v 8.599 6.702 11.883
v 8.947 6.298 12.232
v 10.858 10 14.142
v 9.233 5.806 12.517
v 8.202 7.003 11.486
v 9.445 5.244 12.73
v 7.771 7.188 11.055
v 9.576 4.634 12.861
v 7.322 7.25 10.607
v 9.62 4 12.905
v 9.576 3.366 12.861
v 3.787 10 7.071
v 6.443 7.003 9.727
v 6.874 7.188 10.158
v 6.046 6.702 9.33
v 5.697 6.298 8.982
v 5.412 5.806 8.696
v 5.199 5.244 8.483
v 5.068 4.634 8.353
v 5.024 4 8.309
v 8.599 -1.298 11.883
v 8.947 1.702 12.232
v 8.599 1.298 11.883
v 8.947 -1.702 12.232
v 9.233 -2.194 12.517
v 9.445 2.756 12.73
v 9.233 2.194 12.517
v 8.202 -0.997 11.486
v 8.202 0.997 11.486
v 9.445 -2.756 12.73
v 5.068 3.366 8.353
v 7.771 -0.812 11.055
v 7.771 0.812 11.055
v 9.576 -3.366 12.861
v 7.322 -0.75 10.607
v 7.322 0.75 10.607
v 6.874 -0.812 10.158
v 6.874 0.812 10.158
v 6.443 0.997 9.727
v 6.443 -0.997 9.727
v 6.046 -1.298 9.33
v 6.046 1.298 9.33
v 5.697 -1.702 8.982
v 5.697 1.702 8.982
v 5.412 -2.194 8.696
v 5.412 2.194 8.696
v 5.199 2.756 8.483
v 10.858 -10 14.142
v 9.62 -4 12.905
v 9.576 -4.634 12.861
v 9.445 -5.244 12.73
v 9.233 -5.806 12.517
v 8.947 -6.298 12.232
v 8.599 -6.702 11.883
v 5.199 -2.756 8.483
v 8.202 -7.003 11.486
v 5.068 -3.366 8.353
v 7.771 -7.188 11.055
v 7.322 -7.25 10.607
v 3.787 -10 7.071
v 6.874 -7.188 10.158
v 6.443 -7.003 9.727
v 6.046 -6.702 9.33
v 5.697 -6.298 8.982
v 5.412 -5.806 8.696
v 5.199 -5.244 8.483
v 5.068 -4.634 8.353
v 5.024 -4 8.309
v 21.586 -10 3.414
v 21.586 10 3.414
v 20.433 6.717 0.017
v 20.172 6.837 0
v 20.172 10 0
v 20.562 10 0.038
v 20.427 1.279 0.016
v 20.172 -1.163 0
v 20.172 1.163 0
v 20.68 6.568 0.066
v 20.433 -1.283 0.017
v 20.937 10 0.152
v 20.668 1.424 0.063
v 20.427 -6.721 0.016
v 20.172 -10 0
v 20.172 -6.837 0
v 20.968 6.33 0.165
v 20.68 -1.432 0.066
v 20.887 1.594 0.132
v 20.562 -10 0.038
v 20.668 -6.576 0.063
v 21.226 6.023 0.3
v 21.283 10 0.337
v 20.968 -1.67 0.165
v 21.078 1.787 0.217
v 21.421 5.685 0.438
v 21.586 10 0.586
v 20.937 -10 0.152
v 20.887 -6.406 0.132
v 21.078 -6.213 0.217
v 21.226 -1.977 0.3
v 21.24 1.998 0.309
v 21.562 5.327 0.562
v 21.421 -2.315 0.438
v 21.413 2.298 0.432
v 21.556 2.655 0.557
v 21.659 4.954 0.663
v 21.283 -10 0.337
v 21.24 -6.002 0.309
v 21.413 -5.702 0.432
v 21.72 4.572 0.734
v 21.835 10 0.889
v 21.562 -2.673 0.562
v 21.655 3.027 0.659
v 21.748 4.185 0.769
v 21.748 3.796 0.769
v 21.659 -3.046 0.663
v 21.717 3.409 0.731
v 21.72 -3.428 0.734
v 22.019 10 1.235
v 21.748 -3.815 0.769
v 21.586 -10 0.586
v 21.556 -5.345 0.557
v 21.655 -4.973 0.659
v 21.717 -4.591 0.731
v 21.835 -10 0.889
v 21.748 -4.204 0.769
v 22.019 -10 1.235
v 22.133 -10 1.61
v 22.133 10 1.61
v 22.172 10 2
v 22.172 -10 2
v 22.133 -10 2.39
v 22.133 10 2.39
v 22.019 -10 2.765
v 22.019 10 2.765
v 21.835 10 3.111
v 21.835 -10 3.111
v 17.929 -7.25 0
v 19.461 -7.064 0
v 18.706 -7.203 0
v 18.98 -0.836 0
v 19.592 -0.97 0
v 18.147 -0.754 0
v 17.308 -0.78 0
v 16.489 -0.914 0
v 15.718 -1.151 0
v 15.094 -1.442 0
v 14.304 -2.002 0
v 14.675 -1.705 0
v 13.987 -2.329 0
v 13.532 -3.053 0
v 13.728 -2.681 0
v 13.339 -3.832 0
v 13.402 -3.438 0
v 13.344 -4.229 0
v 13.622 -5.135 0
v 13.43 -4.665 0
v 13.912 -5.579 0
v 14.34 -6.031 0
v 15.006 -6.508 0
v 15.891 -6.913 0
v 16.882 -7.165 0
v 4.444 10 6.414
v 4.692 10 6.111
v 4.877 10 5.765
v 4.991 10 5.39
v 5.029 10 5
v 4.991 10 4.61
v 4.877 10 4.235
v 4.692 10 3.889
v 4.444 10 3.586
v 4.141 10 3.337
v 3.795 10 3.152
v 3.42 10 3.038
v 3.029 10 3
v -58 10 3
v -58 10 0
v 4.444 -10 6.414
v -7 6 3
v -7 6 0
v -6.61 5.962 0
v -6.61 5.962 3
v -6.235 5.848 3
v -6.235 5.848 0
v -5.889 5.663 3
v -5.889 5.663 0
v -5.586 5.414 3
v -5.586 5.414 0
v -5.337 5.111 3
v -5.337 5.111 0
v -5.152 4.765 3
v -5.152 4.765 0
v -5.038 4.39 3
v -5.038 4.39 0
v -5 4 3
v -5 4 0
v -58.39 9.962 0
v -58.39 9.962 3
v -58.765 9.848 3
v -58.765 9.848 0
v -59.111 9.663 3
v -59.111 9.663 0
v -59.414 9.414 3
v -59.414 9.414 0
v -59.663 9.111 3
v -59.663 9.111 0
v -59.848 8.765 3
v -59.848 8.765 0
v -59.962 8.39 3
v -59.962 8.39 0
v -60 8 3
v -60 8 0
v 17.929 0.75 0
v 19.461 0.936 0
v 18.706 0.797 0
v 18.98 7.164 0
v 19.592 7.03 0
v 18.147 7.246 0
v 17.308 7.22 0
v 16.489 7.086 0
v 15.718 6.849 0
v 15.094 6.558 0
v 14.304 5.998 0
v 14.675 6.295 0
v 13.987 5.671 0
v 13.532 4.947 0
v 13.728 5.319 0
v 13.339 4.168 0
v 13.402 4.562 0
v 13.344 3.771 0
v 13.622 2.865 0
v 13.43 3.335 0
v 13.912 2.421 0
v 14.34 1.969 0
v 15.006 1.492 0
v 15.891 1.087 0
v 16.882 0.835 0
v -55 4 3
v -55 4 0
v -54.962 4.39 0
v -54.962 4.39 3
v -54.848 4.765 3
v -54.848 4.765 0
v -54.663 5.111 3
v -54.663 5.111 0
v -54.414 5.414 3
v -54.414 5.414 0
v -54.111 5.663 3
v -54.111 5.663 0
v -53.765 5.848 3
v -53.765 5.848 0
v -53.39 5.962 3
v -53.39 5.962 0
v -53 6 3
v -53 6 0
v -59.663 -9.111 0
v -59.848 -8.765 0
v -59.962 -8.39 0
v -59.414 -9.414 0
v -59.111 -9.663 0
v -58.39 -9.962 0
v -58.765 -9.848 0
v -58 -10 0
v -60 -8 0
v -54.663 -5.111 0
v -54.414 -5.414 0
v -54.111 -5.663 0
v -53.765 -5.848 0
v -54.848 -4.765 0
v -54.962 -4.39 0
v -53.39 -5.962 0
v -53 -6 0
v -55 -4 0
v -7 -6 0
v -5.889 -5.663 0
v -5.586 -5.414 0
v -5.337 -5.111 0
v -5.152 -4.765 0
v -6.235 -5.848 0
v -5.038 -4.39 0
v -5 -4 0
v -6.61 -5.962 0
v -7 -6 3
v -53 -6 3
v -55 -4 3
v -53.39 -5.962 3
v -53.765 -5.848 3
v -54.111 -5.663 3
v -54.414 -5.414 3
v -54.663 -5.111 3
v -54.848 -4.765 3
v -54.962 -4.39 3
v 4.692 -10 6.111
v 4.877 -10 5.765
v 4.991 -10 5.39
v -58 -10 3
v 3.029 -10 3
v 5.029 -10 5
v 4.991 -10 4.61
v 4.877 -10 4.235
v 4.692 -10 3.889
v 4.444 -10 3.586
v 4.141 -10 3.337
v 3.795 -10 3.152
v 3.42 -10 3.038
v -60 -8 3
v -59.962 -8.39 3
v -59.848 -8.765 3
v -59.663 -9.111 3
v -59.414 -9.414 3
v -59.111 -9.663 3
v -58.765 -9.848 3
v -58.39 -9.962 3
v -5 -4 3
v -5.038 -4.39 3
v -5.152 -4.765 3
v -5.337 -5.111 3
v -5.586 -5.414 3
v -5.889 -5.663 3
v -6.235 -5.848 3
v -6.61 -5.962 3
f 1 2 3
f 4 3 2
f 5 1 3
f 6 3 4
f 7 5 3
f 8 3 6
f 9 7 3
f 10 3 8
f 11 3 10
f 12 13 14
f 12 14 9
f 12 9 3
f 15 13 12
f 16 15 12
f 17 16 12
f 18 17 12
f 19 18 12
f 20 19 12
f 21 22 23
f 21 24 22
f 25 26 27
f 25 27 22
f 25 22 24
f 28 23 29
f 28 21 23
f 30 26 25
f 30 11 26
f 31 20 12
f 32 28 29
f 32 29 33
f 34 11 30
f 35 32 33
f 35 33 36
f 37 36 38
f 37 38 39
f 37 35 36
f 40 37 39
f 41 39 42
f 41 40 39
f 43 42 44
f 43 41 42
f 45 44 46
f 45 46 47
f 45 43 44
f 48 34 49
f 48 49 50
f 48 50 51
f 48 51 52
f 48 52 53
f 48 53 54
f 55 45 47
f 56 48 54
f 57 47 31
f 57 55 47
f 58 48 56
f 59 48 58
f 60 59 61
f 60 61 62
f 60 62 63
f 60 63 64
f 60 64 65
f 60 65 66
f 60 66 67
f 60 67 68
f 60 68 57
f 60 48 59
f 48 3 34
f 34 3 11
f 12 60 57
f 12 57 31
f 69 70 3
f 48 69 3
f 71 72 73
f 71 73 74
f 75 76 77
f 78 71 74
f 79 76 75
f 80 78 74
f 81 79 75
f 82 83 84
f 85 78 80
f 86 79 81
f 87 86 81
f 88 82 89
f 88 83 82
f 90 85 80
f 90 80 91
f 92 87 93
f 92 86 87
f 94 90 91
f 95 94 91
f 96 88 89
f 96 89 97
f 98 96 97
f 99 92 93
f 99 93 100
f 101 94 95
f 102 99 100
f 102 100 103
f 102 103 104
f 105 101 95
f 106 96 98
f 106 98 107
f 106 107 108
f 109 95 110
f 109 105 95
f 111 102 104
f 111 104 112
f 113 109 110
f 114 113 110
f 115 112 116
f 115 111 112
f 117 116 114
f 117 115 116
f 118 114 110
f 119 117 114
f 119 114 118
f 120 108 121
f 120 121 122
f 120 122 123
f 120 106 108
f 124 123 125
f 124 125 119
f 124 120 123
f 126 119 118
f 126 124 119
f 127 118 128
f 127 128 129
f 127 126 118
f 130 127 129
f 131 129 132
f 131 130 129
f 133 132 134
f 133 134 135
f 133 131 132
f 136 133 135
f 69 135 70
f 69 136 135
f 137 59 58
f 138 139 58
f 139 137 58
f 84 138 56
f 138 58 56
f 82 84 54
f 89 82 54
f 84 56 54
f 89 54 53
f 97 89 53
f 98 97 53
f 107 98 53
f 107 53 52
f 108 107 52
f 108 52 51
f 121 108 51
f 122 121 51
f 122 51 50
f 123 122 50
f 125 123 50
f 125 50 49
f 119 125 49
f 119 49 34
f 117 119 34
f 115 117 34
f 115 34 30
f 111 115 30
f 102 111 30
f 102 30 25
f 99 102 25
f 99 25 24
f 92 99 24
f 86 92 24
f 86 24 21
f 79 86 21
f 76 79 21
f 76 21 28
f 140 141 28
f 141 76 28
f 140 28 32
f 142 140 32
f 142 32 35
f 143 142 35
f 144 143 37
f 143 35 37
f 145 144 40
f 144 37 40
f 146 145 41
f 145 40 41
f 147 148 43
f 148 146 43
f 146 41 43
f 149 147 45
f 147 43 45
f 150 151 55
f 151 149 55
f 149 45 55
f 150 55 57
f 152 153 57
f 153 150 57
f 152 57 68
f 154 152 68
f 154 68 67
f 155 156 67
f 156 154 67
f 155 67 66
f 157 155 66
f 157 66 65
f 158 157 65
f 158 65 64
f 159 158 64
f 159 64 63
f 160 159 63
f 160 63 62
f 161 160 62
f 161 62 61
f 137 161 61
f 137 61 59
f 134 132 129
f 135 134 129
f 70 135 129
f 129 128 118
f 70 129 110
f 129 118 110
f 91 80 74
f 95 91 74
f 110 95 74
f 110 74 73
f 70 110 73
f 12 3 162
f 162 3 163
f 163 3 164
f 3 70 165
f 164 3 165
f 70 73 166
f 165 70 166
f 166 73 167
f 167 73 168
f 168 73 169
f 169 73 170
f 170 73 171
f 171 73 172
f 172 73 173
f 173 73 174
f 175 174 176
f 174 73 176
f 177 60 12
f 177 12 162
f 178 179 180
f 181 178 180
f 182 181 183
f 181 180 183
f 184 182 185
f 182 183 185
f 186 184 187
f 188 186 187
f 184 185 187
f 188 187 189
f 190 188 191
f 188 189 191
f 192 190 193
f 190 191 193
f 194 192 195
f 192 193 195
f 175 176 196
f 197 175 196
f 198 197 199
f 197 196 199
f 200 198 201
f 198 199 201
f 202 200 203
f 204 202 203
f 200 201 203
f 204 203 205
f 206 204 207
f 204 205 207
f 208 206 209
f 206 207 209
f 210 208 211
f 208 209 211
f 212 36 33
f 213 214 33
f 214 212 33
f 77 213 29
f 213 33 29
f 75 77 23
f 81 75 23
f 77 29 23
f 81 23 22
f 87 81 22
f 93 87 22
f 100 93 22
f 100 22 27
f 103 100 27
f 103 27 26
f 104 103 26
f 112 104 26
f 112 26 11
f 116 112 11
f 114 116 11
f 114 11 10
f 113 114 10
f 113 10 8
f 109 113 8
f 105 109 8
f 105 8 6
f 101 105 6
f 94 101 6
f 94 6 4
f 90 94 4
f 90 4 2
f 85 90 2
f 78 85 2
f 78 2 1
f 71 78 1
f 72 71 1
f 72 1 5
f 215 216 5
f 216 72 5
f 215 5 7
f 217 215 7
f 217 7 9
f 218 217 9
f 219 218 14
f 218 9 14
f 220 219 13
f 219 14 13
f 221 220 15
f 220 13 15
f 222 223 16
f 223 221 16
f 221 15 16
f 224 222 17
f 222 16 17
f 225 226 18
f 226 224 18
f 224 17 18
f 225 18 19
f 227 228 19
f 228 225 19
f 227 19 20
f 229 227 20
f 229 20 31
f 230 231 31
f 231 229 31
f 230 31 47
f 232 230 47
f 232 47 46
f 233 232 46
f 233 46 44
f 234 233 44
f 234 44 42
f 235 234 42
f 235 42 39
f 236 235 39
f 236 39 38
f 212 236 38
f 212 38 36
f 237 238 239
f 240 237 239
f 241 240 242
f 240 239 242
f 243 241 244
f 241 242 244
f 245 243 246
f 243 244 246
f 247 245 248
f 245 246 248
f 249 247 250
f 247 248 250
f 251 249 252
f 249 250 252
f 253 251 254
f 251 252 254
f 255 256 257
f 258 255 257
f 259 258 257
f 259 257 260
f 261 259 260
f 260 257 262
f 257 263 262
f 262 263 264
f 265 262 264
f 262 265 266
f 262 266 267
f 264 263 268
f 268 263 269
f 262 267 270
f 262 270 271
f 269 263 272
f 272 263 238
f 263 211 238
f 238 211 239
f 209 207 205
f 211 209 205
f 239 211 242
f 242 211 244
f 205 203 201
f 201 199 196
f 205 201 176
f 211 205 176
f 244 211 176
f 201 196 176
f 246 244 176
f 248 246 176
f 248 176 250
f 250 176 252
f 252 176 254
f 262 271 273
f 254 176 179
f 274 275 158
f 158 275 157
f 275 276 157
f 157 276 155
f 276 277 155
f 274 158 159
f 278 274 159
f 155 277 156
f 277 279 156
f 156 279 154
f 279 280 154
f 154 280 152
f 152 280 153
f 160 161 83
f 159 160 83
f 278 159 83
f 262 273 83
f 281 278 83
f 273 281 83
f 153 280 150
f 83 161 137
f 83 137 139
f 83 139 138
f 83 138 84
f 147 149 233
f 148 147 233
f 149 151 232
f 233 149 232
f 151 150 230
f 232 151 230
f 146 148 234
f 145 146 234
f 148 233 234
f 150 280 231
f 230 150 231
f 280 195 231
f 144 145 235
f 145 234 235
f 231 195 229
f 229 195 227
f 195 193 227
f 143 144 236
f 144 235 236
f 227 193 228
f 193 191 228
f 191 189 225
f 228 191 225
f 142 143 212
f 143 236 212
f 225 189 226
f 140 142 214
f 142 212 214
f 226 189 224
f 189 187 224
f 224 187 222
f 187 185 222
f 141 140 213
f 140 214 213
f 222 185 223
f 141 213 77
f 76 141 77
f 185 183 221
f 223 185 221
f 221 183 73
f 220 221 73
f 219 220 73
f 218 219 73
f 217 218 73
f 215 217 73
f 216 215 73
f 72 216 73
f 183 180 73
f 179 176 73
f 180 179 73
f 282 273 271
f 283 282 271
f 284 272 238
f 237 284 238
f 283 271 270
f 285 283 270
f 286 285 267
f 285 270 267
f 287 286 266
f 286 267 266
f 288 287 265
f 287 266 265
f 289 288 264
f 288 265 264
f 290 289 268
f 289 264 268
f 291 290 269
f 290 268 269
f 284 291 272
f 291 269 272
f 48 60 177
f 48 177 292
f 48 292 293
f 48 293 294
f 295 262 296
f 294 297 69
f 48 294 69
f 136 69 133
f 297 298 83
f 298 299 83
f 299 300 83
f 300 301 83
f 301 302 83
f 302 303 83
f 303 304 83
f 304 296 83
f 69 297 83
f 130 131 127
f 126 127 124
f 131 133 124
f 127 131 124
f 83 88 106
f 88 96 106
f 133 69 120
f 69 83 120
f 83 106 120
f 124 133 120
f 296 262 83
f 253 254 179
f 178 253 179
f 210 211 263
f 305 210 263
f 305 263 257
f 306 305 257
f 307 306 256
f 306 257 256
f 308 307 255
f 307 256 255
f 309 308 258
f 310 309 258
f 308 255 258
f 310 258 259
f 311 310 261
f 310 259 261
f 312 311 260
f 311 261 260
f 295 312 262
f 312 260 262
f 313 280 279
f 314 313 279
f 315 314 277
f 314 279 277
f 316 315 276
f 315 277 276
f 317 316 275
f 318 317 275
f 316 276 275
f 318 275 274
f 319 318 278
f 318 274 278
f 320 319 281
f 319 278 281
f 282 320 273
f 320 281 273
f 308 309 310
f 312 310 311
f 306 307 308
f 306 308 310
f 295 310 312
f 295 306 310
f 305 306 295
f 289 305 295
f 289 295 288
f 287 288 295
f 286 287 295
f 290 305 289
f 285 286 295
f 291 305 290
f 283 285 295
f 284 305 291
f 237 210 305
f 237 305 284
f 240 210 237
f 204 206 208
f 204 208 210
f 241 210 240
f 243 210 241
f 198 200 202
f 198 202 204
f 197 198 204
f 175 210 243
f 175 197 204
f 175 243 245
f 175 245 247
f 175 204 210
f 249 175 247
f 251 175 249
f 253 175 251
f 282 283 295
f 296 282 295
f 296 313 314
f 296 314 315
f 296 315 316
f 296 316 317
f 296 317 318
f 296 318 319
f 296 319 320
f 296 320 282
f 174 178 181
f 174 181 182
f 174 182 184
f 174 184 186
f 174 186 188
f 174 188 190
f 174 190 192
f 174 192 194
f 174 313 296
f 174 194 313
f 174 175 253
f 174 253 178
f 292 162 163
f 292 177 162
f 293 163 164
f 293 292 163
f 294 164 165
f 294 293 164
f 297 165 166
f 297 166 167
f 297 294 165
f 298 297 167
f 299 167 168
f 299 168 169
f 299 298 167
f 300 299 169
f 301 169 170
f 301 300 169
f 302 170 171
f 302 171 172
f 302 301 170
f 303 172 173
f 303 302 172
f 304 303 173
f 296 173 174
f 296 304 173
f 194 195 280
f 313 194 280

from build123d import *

# Parameters (mm, degrees)
F1_DEPTH = 10
F2_R     = 3.25
F3_DEPTH = 25
F5_DEPTH = 3


with BuildPart() as f1:
    # F0 (on Front) → F1 (new body, symmetric)
    with BuildSketch(Plane.XZ):
        with BuildLine():
            Line((0, 3), (0, 0))
            Line((0, 0), (20.171573, 0))
            ThreePointArc((20.171573, 0), (22.019332, 1.234633), (21.585786, 3.414214))
            Line((21.585786, 3.414214), (10.857864, 14.142136))
            Line((10.857864, 14.142136), (3.786797, 7.071068))
            Line((3.786797, 7.071068), (4.443651, 6.414214))
            ThreePointArc((4.443651, 6.414214), (4.877196, 4.234633), (3.029437, 3))
            Line((3.029437, 3), (0, 3))
        make_face()
    extrude(amount=F1_DEPTH, both=True)

    # F2 (on face) → F3 (cut)
    with BuildSketch(Plane(origin=(-1.642136, 0, 1.642136), x_dir=(0, -1, 0), z_dir=(-0.707107, 0, 0.707107))):
        with Locations((-4, 12.67767)):
            Circle(F2_R)
        with Locations((4, 12.67767)):
            Circle(F2_R)
    extrude(amount=-F3_DEPTH, mode=Mode.SUBTRACT)

    # F4 (on Top) → F5 (join)
    with BuildSketch(Plane.XY):
        with BuildLine():
            Line((0, -10), (0, 10))
            Line((0, 10), (-58, 10))
            ThreePointArc((-58, 10), (-59.414214, 9.414214), (-60, 8))
            Line((-60, 8), (-60, -8))
            ThreePointArc((-60, -8), (-59.414214, -9.414214), (-58, -10))
            Line((-58, -10), (0, -10))
        make_face()
        with BuildLine():
            Line((-53, 6), (-7, 6))
            ThreePointArc((-7, 6), (-5.585786, 5.414214), (-5, 4))
            Line((-5, 4), (-5, -4))
            ThreePointArc((-5, -4), (-5.585786, -5.414214), (-7, -6))
            Line((-7, -6), (-53, -6))
            ThreePointArc((-53, -6), (-54.414214, -5.414214), (-55, -4))
            Line((-55, -4), (-55, 4))
            ThreePointArc((-55, 4), (-54.414214, 5.414214), (-53, 6))
        make_face(mode=Mode.SUBTRACT)
    extrude(amount=F5_DEPTH)


solid = f1.part
